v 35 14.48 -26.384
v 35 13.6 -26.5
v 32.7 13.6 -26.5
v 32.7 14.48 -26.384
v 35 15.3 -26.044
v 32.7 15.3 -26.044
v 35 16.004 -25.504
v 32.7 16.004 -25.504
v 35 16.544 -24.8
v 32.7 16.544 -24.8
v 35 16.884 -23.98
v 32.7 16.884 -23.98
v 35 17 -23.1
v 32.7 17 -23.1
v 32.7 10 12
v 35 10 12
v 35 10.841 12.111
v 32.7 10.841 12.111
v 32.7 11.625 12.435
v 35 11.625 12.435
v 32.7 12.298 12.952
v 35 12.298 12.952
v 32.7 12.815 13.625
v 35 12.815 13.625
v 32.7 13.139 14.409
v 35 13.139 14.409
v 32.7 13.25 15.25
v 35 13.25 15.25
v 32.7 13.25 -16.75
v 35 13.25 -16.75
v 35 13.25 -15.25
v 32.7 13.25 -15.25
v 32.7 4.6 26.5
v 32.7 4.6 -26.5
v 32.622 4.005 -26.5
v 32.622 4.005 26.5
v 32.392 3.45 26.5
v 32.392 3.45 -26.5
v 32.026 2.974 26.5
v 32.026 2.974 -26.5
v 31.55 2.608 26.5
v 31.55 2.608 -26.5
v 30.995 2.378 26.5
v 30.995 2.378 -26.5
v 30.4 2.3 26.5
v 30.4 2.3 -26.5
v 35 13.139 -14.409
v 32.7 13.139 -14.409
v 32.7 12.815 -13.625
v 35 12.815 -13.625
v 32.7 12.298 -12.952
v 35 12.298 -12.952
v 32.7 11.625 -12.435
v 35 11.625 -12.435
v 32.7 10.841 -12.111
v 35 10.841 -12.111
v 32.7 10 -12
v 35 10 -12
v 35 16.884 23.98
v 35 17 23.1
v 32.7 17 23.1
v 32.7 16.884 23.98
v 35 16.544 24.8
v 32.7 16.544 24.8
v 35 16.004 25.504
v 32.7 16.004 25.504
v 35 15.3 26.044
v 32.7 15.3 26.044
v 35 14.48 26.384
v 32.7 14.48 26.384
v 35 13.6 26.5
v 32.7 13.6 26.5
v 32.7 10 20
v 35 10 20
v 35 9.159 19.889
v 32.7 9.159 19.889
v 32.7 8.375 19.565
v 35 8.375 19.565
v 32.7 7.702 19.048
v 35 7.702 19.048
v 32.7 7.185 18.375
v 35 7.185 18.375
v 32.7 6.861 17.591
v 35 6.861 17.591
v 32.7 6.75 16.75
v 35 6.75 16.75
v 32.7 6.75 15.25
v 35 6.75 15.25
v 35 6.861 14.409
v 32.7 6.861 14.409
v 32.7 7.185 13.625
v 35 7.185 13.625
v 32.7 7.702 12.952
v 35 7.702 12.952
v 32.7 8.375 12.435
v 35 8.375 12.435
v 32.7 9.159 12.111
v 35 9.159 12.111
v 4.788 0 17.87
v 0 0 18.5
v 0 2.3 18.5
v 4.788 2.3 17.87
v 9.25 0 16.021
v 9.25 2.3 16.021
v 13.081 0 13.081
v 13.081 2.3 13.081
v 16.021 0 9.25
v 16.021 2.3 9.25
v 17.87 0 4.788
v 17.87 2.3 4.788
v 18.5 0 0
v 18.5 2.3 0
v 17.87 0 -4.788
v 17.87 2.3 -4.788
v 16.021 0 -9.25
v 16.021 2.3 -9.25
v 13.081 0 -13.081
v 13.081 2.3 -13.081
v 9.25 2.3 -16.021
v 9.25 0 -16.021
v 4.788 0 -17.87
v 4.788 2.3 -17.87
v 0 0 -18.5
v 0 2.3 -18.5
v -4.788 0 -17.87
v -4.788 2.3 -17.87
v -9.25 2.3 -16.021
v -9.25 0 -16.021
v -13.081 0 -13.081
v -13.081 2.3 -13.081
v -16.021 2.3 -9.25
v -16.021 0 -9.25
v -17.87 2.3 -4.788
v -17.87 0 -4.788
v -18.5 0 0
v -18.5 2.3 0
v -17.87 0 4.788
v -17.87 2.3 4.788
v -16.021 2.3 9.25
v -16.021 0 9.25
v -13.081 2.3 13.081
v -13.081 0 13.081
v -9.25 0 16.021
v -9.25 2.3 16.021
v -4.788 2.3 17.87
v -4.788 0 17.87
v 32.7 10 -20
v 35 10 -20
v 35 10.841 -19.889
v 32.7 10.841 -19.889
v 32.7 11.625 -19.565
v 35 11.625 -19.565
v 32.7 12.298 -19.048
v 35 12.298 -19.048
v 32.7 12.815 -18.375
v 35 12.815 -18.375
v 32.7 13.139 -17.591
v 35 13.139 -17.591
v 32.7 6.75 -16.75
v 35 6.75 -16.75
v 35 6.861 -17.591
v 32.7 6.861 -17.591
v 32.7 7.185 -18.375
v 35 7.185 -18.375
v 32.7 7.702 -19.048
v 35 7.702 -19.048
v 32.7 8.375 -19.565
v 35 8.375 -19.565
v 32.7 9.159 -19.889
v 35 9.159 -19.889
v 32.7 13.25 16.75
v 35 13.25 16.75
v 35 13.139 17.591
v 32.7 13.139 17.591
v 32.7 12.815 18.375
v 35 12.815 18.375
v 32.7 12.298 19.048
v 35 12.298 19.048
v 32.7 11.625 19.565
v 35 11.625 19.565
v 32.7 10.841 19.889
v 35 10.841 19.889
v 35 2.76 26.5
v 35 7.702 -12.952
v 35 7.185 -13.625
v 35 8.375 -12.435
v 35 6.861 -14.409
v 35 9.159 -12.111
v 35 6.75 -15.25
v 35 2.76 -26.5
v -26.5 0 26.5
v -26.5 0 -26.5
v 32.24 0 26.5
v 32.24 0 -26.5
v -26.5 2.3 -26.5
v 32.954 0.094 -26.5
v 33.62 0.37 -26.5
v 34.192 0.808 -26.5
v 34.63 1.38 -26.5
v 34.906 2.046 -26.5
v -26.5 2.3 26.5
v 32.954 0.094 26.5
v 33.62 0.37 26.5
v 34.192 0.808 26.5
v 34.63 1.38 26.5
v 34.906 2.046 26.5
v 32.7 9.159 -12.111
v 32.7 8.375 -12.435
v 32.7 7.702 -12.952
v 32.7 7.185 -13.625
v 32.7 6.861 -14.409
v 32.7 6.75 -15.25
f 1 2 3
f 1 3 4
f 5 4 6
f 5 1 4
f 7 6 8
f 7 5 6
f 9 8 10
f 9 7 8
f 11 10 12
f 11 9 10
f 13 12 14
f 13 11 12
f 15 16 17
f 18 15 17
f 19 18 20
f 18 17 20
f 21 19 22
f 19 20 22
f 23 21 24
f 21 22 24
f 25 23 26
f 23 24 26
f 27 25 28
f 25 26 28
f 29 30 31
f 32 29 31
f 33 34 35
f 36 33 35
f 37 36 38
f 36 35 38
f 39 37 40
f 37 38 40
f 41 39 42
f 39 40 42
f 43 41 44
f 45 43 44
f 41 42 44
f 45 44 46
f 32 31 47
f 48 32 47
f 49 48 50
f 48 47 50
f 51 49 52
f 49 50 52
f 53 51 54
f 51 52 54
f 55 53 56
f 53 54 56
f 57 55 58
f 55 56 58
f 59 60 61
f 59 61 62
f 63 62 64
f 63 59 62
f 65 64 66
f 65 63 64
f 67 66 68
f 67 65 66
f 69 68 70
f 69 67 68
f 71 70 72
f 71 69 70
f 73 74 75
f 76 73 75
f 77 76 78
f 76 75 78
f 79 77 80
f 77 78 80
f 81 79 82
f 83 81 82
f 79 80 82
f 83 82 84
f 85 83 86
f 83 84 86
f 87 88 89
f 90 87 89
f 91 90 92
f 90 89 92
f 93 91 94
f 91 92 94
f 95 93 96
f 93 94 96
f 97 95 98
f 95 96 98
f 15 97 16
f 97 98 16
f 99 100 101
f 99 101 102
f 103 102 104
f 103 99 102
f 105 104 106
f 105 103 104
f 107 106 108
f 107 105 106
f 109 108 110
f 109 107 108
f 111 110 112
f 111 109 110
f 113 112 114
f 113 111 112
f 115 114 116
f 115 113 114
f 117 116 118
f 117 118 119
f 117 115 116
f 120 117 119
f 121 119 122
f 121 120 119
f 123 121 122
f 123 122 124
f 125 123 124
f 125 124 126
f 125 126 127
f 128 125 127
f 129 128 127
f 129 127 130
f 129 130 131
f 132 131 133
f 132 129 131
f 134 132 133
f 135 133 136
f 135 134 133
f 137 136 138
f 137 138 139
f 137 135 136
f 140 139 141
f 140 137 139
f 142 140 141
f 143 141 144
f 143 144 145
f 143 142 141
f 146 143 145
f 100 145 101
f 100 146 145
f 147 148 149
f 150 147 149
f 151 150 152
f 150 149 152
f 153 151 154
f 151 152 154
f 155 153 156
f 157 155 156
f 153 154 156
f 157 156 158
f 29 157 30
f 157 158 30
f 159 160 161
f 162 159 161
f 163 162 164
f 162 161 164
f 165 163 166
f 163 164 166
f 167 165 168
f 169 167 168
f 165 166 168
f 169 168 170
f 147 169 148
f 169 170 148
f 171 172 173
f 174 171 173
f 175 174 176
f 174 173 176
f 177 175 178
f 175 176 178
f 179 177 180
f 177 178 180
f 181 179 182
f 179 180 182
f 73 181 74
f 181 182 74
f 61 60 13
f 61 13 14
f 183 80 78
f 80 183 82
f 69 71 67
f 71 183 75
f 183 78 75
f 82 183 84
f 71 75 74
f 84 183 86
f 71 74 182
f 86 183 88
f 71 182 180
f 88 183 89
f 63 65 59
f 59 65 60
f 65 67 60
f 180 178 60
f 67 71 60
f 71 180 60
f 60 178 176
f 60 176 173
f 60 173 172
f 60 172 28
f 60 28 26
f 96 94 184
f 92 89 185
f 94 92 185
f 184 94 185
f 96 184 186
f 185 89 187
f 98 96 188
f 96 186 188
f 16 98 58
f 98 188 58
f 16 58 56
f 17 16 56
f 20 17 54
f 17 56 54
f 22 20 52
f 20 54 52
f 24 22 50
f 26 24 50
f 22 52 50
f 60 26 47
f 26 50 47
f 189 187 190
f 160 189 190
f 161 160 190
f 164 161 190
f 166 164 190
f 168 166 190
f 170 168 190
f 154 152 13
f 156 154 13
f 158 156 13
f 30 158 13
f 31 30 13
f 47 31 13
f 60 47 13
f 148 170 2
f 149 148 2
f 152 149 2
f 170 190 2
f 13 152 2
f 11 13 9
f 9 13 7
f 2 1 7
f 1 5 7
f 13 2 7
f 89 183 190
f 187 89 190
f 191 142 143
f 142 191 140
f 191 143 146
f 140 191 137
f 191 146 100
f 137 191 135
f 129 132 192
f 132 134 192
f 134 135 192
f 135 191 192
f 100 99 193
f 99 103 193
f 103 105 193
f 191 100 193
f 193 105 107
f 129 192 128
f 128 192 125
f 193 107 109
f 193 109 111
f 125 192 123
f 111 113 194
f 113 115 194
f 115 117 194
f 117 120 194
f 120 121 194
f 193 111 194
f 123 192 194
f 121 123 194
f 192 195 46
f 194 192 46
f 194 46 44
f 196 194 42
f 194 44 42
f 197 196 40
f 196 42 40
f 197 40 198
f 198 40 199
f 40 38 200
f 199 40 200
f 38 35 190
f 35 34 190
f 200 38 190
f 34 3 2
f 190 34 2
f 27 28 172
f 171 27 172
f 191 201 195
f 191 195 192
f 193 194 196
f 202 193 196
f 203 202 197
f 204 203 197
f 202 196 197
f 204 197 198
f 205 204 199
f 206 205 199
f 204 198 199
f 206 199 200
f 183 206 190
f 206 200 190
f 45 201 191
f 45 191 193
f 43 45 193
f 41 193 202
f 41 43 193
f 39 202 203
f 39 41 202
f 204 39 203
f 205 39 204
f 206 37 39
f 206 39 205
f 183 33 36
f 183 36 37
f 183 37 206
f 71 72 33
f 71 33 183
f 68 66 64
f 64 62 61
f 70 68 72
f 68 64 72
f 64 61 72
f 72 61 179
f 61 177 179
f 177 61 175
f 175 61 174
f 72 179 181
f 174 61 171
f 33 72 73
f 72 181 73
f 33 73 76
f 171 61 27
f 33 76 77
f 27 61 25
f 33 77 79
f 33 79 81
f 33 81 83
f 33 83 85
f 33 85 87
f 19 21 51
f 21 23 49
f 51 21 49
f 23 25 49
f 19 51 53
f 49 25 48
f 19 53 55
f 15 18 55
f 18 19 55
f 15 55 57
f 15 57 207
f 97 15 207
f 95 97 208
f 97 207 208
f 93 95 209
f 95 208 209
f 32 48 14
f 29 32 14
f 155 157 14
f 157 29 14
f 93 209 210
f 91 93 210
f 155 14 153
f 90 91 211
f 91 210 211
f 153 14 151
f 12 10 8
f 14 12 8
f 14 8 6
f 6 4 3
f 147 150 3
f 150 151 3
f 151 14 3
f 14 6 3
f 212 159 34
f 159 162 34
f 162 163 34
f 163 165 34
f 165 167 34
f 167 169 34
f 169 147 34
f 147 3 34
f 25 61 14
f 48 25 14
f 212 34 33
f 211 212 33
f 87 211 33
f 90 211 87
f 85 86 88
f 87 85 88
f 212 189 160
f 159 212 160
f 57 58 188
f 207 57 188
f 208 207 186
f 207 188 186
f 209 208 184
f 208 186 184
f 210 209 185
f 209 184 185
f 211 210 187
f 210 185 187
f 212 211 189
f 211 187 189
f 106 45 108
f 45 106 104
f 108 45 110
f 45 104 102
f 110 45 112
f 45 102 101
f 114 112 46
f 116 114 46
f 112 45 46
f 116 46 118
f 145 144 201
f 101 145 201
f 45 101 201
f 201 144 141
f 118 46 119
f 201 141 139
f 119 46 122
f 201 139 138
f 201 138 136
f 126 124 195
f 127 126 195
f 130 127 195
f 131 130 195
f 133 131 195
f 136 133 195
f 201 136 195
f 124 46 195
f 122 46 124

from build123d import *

# Parameters (mm, degrees)
EXTRUDE_1_DEPTH      = 26.5
EXTRUDE_1_DEPTH_BACK = 26.5
CUT_EXTRUDE_1_DEPTH  = 2.3
CUT_EXTRUDE_2_DEPTH  = 2.3
SKETCH_4_R           = 18.5
CUT_EXTRUDE_3_DEPTH  = 2.3
SKETCH_5_W           = 142.237580419
SKETCH_5_H           = 102.661015156
CUT_EXTRUDE_4_DEPTH  = 3.3


with BuildPart() as part:
    # 草图1 → 凸台-拉伸1 (new, two sides: drawn at the far end of the back side and taken through both)
    with BuildSketch(Plane.XY.offset(-EXTRUDE_1_DEPTH_BACK)):
        with BuildLine():
            Line((-26.5, 0), (32.24, 0))
            ThreePointArc((32.24, 0), (34.191614716, 0.808385284), (35, 2.76))
            Line((35, 2.76), (35, 17))
            Line((35, 17), (32.7, 17))
            Line((32.7, 17), (32.7, 4.6))
            ThreePointArc((32.7, 4.6), (32.026345597, 2.973654403), (30.4, 2.3))
            Line((30.4, 2.3), (-26.5, 2.3))
            Line((-26.5, 2.3), (-26.5, 0))
        make_face()
    extrude(amount=EXTRUDE_1_DEPTH + EXTRUDE_1_DEPTH_BACK)

    # 草图2 → 切除-拉伸1 (cut)
    with BuildSketch(Plane(origin=(35, 0, 0), x_dir=(0, 0, -1), z_dir=(1, 0, 0))):
        with BuildLine():
            Line((-16.75, 6.75), (-15.25, 6.75))
            ThreePointArc((-15.25, 6.75), (-12.951902961, 7.701902961), (-12, 10))
            ThreePointArc((-12, 10), (-12.951902961, 12.298097039), (-15.25, 13.25))
            Line((-15.25, 13.25), (-16.75, 13.25))
            ThreePointArc((-16.75, 13.25), (-19.048097039, 12.298097039), (-20, 10))
            ThreePointArc((-20, 10), (-19.048097039, 7.701902961), (-16.75, 6.75))
        make_face()
    extrude(amount=-CUT_EXTRUDE_1_DEPTH, mode=Mode.SUBTRACT)

    # 草图3 → 切除-拉伸2 (cut)
    with BuildSketch(Plane(origin=(35, 0, 0), x_dir=(0, 0, -1), z_dir=(1, 0, 0))):
        with BuildLine():
            Line((15.25, 6.75), (16.75, 6.75))
            ThreePointArc((16.75, 6.75), (19.048097039, 7.701902961), (20, 10))
            ThreePointArc((20, 10), (19.048097039, 12.298097039), (16.75, 13.25))
            Line((16.75, 13.25), (15.25, 13.25))
            ThreePointArc((15.25, 13.25), (12.951902961, 12.298097039), (12, 10))
            ThreePointArc((12, 10), (12.951902961, 7.701902961), (15.25, 6.75))
        make_face()
    extrude(amount=-CUT_EXTRUDE_2_DEPTH, mode=Mode.SUBTRACT)

    # 草图4 → 切除-拉伸3 (cut)
    with BuildSketch(Plane(origin=(0, 0, 0), x_dir=(1, 0, 0), z_dir=(0, 1, 0))):
        Circle(SKETCH_4_R)
    extrude(amount=CUT_EXTRUDE_3_DEPTH, mode=Mode.SUBTRACT)

    # 草图5 → 切除-拉伸4 (cut)
    with BuildSketch(Plane(origin=(35, 0, 0), x_dir=(0, 0, -1), z_dir=(1, 0, 0))):
        with Locations((4.017170159, 13.868386078)):
            Rectangle(SKETCH_5_W, SKETCH_5_H)
        with BuildLine():
            Line((-26.5, 0), (26.5, 0))
            Line((26.5, 0), (26.5, 13.6))
            ThreePointArc((26.5, 13.6), (25.504163056, 16.004163056), (23.1, 17))
            Line((23.1, 17), (-23.1, 17))
            ThreePointArc((-23.1, 17), (-25.504163056, 16.004163056), (-26.5, 13.6))
            Line((-26.5, 13.6), (-26.5, 0))
        make_face(mode=Mode.SUBTRACT)
    extrude(amount=-CUT_EXTRUDE_4_DEPTH, mode=Mode.SUBTRACT)


solid = part.part
